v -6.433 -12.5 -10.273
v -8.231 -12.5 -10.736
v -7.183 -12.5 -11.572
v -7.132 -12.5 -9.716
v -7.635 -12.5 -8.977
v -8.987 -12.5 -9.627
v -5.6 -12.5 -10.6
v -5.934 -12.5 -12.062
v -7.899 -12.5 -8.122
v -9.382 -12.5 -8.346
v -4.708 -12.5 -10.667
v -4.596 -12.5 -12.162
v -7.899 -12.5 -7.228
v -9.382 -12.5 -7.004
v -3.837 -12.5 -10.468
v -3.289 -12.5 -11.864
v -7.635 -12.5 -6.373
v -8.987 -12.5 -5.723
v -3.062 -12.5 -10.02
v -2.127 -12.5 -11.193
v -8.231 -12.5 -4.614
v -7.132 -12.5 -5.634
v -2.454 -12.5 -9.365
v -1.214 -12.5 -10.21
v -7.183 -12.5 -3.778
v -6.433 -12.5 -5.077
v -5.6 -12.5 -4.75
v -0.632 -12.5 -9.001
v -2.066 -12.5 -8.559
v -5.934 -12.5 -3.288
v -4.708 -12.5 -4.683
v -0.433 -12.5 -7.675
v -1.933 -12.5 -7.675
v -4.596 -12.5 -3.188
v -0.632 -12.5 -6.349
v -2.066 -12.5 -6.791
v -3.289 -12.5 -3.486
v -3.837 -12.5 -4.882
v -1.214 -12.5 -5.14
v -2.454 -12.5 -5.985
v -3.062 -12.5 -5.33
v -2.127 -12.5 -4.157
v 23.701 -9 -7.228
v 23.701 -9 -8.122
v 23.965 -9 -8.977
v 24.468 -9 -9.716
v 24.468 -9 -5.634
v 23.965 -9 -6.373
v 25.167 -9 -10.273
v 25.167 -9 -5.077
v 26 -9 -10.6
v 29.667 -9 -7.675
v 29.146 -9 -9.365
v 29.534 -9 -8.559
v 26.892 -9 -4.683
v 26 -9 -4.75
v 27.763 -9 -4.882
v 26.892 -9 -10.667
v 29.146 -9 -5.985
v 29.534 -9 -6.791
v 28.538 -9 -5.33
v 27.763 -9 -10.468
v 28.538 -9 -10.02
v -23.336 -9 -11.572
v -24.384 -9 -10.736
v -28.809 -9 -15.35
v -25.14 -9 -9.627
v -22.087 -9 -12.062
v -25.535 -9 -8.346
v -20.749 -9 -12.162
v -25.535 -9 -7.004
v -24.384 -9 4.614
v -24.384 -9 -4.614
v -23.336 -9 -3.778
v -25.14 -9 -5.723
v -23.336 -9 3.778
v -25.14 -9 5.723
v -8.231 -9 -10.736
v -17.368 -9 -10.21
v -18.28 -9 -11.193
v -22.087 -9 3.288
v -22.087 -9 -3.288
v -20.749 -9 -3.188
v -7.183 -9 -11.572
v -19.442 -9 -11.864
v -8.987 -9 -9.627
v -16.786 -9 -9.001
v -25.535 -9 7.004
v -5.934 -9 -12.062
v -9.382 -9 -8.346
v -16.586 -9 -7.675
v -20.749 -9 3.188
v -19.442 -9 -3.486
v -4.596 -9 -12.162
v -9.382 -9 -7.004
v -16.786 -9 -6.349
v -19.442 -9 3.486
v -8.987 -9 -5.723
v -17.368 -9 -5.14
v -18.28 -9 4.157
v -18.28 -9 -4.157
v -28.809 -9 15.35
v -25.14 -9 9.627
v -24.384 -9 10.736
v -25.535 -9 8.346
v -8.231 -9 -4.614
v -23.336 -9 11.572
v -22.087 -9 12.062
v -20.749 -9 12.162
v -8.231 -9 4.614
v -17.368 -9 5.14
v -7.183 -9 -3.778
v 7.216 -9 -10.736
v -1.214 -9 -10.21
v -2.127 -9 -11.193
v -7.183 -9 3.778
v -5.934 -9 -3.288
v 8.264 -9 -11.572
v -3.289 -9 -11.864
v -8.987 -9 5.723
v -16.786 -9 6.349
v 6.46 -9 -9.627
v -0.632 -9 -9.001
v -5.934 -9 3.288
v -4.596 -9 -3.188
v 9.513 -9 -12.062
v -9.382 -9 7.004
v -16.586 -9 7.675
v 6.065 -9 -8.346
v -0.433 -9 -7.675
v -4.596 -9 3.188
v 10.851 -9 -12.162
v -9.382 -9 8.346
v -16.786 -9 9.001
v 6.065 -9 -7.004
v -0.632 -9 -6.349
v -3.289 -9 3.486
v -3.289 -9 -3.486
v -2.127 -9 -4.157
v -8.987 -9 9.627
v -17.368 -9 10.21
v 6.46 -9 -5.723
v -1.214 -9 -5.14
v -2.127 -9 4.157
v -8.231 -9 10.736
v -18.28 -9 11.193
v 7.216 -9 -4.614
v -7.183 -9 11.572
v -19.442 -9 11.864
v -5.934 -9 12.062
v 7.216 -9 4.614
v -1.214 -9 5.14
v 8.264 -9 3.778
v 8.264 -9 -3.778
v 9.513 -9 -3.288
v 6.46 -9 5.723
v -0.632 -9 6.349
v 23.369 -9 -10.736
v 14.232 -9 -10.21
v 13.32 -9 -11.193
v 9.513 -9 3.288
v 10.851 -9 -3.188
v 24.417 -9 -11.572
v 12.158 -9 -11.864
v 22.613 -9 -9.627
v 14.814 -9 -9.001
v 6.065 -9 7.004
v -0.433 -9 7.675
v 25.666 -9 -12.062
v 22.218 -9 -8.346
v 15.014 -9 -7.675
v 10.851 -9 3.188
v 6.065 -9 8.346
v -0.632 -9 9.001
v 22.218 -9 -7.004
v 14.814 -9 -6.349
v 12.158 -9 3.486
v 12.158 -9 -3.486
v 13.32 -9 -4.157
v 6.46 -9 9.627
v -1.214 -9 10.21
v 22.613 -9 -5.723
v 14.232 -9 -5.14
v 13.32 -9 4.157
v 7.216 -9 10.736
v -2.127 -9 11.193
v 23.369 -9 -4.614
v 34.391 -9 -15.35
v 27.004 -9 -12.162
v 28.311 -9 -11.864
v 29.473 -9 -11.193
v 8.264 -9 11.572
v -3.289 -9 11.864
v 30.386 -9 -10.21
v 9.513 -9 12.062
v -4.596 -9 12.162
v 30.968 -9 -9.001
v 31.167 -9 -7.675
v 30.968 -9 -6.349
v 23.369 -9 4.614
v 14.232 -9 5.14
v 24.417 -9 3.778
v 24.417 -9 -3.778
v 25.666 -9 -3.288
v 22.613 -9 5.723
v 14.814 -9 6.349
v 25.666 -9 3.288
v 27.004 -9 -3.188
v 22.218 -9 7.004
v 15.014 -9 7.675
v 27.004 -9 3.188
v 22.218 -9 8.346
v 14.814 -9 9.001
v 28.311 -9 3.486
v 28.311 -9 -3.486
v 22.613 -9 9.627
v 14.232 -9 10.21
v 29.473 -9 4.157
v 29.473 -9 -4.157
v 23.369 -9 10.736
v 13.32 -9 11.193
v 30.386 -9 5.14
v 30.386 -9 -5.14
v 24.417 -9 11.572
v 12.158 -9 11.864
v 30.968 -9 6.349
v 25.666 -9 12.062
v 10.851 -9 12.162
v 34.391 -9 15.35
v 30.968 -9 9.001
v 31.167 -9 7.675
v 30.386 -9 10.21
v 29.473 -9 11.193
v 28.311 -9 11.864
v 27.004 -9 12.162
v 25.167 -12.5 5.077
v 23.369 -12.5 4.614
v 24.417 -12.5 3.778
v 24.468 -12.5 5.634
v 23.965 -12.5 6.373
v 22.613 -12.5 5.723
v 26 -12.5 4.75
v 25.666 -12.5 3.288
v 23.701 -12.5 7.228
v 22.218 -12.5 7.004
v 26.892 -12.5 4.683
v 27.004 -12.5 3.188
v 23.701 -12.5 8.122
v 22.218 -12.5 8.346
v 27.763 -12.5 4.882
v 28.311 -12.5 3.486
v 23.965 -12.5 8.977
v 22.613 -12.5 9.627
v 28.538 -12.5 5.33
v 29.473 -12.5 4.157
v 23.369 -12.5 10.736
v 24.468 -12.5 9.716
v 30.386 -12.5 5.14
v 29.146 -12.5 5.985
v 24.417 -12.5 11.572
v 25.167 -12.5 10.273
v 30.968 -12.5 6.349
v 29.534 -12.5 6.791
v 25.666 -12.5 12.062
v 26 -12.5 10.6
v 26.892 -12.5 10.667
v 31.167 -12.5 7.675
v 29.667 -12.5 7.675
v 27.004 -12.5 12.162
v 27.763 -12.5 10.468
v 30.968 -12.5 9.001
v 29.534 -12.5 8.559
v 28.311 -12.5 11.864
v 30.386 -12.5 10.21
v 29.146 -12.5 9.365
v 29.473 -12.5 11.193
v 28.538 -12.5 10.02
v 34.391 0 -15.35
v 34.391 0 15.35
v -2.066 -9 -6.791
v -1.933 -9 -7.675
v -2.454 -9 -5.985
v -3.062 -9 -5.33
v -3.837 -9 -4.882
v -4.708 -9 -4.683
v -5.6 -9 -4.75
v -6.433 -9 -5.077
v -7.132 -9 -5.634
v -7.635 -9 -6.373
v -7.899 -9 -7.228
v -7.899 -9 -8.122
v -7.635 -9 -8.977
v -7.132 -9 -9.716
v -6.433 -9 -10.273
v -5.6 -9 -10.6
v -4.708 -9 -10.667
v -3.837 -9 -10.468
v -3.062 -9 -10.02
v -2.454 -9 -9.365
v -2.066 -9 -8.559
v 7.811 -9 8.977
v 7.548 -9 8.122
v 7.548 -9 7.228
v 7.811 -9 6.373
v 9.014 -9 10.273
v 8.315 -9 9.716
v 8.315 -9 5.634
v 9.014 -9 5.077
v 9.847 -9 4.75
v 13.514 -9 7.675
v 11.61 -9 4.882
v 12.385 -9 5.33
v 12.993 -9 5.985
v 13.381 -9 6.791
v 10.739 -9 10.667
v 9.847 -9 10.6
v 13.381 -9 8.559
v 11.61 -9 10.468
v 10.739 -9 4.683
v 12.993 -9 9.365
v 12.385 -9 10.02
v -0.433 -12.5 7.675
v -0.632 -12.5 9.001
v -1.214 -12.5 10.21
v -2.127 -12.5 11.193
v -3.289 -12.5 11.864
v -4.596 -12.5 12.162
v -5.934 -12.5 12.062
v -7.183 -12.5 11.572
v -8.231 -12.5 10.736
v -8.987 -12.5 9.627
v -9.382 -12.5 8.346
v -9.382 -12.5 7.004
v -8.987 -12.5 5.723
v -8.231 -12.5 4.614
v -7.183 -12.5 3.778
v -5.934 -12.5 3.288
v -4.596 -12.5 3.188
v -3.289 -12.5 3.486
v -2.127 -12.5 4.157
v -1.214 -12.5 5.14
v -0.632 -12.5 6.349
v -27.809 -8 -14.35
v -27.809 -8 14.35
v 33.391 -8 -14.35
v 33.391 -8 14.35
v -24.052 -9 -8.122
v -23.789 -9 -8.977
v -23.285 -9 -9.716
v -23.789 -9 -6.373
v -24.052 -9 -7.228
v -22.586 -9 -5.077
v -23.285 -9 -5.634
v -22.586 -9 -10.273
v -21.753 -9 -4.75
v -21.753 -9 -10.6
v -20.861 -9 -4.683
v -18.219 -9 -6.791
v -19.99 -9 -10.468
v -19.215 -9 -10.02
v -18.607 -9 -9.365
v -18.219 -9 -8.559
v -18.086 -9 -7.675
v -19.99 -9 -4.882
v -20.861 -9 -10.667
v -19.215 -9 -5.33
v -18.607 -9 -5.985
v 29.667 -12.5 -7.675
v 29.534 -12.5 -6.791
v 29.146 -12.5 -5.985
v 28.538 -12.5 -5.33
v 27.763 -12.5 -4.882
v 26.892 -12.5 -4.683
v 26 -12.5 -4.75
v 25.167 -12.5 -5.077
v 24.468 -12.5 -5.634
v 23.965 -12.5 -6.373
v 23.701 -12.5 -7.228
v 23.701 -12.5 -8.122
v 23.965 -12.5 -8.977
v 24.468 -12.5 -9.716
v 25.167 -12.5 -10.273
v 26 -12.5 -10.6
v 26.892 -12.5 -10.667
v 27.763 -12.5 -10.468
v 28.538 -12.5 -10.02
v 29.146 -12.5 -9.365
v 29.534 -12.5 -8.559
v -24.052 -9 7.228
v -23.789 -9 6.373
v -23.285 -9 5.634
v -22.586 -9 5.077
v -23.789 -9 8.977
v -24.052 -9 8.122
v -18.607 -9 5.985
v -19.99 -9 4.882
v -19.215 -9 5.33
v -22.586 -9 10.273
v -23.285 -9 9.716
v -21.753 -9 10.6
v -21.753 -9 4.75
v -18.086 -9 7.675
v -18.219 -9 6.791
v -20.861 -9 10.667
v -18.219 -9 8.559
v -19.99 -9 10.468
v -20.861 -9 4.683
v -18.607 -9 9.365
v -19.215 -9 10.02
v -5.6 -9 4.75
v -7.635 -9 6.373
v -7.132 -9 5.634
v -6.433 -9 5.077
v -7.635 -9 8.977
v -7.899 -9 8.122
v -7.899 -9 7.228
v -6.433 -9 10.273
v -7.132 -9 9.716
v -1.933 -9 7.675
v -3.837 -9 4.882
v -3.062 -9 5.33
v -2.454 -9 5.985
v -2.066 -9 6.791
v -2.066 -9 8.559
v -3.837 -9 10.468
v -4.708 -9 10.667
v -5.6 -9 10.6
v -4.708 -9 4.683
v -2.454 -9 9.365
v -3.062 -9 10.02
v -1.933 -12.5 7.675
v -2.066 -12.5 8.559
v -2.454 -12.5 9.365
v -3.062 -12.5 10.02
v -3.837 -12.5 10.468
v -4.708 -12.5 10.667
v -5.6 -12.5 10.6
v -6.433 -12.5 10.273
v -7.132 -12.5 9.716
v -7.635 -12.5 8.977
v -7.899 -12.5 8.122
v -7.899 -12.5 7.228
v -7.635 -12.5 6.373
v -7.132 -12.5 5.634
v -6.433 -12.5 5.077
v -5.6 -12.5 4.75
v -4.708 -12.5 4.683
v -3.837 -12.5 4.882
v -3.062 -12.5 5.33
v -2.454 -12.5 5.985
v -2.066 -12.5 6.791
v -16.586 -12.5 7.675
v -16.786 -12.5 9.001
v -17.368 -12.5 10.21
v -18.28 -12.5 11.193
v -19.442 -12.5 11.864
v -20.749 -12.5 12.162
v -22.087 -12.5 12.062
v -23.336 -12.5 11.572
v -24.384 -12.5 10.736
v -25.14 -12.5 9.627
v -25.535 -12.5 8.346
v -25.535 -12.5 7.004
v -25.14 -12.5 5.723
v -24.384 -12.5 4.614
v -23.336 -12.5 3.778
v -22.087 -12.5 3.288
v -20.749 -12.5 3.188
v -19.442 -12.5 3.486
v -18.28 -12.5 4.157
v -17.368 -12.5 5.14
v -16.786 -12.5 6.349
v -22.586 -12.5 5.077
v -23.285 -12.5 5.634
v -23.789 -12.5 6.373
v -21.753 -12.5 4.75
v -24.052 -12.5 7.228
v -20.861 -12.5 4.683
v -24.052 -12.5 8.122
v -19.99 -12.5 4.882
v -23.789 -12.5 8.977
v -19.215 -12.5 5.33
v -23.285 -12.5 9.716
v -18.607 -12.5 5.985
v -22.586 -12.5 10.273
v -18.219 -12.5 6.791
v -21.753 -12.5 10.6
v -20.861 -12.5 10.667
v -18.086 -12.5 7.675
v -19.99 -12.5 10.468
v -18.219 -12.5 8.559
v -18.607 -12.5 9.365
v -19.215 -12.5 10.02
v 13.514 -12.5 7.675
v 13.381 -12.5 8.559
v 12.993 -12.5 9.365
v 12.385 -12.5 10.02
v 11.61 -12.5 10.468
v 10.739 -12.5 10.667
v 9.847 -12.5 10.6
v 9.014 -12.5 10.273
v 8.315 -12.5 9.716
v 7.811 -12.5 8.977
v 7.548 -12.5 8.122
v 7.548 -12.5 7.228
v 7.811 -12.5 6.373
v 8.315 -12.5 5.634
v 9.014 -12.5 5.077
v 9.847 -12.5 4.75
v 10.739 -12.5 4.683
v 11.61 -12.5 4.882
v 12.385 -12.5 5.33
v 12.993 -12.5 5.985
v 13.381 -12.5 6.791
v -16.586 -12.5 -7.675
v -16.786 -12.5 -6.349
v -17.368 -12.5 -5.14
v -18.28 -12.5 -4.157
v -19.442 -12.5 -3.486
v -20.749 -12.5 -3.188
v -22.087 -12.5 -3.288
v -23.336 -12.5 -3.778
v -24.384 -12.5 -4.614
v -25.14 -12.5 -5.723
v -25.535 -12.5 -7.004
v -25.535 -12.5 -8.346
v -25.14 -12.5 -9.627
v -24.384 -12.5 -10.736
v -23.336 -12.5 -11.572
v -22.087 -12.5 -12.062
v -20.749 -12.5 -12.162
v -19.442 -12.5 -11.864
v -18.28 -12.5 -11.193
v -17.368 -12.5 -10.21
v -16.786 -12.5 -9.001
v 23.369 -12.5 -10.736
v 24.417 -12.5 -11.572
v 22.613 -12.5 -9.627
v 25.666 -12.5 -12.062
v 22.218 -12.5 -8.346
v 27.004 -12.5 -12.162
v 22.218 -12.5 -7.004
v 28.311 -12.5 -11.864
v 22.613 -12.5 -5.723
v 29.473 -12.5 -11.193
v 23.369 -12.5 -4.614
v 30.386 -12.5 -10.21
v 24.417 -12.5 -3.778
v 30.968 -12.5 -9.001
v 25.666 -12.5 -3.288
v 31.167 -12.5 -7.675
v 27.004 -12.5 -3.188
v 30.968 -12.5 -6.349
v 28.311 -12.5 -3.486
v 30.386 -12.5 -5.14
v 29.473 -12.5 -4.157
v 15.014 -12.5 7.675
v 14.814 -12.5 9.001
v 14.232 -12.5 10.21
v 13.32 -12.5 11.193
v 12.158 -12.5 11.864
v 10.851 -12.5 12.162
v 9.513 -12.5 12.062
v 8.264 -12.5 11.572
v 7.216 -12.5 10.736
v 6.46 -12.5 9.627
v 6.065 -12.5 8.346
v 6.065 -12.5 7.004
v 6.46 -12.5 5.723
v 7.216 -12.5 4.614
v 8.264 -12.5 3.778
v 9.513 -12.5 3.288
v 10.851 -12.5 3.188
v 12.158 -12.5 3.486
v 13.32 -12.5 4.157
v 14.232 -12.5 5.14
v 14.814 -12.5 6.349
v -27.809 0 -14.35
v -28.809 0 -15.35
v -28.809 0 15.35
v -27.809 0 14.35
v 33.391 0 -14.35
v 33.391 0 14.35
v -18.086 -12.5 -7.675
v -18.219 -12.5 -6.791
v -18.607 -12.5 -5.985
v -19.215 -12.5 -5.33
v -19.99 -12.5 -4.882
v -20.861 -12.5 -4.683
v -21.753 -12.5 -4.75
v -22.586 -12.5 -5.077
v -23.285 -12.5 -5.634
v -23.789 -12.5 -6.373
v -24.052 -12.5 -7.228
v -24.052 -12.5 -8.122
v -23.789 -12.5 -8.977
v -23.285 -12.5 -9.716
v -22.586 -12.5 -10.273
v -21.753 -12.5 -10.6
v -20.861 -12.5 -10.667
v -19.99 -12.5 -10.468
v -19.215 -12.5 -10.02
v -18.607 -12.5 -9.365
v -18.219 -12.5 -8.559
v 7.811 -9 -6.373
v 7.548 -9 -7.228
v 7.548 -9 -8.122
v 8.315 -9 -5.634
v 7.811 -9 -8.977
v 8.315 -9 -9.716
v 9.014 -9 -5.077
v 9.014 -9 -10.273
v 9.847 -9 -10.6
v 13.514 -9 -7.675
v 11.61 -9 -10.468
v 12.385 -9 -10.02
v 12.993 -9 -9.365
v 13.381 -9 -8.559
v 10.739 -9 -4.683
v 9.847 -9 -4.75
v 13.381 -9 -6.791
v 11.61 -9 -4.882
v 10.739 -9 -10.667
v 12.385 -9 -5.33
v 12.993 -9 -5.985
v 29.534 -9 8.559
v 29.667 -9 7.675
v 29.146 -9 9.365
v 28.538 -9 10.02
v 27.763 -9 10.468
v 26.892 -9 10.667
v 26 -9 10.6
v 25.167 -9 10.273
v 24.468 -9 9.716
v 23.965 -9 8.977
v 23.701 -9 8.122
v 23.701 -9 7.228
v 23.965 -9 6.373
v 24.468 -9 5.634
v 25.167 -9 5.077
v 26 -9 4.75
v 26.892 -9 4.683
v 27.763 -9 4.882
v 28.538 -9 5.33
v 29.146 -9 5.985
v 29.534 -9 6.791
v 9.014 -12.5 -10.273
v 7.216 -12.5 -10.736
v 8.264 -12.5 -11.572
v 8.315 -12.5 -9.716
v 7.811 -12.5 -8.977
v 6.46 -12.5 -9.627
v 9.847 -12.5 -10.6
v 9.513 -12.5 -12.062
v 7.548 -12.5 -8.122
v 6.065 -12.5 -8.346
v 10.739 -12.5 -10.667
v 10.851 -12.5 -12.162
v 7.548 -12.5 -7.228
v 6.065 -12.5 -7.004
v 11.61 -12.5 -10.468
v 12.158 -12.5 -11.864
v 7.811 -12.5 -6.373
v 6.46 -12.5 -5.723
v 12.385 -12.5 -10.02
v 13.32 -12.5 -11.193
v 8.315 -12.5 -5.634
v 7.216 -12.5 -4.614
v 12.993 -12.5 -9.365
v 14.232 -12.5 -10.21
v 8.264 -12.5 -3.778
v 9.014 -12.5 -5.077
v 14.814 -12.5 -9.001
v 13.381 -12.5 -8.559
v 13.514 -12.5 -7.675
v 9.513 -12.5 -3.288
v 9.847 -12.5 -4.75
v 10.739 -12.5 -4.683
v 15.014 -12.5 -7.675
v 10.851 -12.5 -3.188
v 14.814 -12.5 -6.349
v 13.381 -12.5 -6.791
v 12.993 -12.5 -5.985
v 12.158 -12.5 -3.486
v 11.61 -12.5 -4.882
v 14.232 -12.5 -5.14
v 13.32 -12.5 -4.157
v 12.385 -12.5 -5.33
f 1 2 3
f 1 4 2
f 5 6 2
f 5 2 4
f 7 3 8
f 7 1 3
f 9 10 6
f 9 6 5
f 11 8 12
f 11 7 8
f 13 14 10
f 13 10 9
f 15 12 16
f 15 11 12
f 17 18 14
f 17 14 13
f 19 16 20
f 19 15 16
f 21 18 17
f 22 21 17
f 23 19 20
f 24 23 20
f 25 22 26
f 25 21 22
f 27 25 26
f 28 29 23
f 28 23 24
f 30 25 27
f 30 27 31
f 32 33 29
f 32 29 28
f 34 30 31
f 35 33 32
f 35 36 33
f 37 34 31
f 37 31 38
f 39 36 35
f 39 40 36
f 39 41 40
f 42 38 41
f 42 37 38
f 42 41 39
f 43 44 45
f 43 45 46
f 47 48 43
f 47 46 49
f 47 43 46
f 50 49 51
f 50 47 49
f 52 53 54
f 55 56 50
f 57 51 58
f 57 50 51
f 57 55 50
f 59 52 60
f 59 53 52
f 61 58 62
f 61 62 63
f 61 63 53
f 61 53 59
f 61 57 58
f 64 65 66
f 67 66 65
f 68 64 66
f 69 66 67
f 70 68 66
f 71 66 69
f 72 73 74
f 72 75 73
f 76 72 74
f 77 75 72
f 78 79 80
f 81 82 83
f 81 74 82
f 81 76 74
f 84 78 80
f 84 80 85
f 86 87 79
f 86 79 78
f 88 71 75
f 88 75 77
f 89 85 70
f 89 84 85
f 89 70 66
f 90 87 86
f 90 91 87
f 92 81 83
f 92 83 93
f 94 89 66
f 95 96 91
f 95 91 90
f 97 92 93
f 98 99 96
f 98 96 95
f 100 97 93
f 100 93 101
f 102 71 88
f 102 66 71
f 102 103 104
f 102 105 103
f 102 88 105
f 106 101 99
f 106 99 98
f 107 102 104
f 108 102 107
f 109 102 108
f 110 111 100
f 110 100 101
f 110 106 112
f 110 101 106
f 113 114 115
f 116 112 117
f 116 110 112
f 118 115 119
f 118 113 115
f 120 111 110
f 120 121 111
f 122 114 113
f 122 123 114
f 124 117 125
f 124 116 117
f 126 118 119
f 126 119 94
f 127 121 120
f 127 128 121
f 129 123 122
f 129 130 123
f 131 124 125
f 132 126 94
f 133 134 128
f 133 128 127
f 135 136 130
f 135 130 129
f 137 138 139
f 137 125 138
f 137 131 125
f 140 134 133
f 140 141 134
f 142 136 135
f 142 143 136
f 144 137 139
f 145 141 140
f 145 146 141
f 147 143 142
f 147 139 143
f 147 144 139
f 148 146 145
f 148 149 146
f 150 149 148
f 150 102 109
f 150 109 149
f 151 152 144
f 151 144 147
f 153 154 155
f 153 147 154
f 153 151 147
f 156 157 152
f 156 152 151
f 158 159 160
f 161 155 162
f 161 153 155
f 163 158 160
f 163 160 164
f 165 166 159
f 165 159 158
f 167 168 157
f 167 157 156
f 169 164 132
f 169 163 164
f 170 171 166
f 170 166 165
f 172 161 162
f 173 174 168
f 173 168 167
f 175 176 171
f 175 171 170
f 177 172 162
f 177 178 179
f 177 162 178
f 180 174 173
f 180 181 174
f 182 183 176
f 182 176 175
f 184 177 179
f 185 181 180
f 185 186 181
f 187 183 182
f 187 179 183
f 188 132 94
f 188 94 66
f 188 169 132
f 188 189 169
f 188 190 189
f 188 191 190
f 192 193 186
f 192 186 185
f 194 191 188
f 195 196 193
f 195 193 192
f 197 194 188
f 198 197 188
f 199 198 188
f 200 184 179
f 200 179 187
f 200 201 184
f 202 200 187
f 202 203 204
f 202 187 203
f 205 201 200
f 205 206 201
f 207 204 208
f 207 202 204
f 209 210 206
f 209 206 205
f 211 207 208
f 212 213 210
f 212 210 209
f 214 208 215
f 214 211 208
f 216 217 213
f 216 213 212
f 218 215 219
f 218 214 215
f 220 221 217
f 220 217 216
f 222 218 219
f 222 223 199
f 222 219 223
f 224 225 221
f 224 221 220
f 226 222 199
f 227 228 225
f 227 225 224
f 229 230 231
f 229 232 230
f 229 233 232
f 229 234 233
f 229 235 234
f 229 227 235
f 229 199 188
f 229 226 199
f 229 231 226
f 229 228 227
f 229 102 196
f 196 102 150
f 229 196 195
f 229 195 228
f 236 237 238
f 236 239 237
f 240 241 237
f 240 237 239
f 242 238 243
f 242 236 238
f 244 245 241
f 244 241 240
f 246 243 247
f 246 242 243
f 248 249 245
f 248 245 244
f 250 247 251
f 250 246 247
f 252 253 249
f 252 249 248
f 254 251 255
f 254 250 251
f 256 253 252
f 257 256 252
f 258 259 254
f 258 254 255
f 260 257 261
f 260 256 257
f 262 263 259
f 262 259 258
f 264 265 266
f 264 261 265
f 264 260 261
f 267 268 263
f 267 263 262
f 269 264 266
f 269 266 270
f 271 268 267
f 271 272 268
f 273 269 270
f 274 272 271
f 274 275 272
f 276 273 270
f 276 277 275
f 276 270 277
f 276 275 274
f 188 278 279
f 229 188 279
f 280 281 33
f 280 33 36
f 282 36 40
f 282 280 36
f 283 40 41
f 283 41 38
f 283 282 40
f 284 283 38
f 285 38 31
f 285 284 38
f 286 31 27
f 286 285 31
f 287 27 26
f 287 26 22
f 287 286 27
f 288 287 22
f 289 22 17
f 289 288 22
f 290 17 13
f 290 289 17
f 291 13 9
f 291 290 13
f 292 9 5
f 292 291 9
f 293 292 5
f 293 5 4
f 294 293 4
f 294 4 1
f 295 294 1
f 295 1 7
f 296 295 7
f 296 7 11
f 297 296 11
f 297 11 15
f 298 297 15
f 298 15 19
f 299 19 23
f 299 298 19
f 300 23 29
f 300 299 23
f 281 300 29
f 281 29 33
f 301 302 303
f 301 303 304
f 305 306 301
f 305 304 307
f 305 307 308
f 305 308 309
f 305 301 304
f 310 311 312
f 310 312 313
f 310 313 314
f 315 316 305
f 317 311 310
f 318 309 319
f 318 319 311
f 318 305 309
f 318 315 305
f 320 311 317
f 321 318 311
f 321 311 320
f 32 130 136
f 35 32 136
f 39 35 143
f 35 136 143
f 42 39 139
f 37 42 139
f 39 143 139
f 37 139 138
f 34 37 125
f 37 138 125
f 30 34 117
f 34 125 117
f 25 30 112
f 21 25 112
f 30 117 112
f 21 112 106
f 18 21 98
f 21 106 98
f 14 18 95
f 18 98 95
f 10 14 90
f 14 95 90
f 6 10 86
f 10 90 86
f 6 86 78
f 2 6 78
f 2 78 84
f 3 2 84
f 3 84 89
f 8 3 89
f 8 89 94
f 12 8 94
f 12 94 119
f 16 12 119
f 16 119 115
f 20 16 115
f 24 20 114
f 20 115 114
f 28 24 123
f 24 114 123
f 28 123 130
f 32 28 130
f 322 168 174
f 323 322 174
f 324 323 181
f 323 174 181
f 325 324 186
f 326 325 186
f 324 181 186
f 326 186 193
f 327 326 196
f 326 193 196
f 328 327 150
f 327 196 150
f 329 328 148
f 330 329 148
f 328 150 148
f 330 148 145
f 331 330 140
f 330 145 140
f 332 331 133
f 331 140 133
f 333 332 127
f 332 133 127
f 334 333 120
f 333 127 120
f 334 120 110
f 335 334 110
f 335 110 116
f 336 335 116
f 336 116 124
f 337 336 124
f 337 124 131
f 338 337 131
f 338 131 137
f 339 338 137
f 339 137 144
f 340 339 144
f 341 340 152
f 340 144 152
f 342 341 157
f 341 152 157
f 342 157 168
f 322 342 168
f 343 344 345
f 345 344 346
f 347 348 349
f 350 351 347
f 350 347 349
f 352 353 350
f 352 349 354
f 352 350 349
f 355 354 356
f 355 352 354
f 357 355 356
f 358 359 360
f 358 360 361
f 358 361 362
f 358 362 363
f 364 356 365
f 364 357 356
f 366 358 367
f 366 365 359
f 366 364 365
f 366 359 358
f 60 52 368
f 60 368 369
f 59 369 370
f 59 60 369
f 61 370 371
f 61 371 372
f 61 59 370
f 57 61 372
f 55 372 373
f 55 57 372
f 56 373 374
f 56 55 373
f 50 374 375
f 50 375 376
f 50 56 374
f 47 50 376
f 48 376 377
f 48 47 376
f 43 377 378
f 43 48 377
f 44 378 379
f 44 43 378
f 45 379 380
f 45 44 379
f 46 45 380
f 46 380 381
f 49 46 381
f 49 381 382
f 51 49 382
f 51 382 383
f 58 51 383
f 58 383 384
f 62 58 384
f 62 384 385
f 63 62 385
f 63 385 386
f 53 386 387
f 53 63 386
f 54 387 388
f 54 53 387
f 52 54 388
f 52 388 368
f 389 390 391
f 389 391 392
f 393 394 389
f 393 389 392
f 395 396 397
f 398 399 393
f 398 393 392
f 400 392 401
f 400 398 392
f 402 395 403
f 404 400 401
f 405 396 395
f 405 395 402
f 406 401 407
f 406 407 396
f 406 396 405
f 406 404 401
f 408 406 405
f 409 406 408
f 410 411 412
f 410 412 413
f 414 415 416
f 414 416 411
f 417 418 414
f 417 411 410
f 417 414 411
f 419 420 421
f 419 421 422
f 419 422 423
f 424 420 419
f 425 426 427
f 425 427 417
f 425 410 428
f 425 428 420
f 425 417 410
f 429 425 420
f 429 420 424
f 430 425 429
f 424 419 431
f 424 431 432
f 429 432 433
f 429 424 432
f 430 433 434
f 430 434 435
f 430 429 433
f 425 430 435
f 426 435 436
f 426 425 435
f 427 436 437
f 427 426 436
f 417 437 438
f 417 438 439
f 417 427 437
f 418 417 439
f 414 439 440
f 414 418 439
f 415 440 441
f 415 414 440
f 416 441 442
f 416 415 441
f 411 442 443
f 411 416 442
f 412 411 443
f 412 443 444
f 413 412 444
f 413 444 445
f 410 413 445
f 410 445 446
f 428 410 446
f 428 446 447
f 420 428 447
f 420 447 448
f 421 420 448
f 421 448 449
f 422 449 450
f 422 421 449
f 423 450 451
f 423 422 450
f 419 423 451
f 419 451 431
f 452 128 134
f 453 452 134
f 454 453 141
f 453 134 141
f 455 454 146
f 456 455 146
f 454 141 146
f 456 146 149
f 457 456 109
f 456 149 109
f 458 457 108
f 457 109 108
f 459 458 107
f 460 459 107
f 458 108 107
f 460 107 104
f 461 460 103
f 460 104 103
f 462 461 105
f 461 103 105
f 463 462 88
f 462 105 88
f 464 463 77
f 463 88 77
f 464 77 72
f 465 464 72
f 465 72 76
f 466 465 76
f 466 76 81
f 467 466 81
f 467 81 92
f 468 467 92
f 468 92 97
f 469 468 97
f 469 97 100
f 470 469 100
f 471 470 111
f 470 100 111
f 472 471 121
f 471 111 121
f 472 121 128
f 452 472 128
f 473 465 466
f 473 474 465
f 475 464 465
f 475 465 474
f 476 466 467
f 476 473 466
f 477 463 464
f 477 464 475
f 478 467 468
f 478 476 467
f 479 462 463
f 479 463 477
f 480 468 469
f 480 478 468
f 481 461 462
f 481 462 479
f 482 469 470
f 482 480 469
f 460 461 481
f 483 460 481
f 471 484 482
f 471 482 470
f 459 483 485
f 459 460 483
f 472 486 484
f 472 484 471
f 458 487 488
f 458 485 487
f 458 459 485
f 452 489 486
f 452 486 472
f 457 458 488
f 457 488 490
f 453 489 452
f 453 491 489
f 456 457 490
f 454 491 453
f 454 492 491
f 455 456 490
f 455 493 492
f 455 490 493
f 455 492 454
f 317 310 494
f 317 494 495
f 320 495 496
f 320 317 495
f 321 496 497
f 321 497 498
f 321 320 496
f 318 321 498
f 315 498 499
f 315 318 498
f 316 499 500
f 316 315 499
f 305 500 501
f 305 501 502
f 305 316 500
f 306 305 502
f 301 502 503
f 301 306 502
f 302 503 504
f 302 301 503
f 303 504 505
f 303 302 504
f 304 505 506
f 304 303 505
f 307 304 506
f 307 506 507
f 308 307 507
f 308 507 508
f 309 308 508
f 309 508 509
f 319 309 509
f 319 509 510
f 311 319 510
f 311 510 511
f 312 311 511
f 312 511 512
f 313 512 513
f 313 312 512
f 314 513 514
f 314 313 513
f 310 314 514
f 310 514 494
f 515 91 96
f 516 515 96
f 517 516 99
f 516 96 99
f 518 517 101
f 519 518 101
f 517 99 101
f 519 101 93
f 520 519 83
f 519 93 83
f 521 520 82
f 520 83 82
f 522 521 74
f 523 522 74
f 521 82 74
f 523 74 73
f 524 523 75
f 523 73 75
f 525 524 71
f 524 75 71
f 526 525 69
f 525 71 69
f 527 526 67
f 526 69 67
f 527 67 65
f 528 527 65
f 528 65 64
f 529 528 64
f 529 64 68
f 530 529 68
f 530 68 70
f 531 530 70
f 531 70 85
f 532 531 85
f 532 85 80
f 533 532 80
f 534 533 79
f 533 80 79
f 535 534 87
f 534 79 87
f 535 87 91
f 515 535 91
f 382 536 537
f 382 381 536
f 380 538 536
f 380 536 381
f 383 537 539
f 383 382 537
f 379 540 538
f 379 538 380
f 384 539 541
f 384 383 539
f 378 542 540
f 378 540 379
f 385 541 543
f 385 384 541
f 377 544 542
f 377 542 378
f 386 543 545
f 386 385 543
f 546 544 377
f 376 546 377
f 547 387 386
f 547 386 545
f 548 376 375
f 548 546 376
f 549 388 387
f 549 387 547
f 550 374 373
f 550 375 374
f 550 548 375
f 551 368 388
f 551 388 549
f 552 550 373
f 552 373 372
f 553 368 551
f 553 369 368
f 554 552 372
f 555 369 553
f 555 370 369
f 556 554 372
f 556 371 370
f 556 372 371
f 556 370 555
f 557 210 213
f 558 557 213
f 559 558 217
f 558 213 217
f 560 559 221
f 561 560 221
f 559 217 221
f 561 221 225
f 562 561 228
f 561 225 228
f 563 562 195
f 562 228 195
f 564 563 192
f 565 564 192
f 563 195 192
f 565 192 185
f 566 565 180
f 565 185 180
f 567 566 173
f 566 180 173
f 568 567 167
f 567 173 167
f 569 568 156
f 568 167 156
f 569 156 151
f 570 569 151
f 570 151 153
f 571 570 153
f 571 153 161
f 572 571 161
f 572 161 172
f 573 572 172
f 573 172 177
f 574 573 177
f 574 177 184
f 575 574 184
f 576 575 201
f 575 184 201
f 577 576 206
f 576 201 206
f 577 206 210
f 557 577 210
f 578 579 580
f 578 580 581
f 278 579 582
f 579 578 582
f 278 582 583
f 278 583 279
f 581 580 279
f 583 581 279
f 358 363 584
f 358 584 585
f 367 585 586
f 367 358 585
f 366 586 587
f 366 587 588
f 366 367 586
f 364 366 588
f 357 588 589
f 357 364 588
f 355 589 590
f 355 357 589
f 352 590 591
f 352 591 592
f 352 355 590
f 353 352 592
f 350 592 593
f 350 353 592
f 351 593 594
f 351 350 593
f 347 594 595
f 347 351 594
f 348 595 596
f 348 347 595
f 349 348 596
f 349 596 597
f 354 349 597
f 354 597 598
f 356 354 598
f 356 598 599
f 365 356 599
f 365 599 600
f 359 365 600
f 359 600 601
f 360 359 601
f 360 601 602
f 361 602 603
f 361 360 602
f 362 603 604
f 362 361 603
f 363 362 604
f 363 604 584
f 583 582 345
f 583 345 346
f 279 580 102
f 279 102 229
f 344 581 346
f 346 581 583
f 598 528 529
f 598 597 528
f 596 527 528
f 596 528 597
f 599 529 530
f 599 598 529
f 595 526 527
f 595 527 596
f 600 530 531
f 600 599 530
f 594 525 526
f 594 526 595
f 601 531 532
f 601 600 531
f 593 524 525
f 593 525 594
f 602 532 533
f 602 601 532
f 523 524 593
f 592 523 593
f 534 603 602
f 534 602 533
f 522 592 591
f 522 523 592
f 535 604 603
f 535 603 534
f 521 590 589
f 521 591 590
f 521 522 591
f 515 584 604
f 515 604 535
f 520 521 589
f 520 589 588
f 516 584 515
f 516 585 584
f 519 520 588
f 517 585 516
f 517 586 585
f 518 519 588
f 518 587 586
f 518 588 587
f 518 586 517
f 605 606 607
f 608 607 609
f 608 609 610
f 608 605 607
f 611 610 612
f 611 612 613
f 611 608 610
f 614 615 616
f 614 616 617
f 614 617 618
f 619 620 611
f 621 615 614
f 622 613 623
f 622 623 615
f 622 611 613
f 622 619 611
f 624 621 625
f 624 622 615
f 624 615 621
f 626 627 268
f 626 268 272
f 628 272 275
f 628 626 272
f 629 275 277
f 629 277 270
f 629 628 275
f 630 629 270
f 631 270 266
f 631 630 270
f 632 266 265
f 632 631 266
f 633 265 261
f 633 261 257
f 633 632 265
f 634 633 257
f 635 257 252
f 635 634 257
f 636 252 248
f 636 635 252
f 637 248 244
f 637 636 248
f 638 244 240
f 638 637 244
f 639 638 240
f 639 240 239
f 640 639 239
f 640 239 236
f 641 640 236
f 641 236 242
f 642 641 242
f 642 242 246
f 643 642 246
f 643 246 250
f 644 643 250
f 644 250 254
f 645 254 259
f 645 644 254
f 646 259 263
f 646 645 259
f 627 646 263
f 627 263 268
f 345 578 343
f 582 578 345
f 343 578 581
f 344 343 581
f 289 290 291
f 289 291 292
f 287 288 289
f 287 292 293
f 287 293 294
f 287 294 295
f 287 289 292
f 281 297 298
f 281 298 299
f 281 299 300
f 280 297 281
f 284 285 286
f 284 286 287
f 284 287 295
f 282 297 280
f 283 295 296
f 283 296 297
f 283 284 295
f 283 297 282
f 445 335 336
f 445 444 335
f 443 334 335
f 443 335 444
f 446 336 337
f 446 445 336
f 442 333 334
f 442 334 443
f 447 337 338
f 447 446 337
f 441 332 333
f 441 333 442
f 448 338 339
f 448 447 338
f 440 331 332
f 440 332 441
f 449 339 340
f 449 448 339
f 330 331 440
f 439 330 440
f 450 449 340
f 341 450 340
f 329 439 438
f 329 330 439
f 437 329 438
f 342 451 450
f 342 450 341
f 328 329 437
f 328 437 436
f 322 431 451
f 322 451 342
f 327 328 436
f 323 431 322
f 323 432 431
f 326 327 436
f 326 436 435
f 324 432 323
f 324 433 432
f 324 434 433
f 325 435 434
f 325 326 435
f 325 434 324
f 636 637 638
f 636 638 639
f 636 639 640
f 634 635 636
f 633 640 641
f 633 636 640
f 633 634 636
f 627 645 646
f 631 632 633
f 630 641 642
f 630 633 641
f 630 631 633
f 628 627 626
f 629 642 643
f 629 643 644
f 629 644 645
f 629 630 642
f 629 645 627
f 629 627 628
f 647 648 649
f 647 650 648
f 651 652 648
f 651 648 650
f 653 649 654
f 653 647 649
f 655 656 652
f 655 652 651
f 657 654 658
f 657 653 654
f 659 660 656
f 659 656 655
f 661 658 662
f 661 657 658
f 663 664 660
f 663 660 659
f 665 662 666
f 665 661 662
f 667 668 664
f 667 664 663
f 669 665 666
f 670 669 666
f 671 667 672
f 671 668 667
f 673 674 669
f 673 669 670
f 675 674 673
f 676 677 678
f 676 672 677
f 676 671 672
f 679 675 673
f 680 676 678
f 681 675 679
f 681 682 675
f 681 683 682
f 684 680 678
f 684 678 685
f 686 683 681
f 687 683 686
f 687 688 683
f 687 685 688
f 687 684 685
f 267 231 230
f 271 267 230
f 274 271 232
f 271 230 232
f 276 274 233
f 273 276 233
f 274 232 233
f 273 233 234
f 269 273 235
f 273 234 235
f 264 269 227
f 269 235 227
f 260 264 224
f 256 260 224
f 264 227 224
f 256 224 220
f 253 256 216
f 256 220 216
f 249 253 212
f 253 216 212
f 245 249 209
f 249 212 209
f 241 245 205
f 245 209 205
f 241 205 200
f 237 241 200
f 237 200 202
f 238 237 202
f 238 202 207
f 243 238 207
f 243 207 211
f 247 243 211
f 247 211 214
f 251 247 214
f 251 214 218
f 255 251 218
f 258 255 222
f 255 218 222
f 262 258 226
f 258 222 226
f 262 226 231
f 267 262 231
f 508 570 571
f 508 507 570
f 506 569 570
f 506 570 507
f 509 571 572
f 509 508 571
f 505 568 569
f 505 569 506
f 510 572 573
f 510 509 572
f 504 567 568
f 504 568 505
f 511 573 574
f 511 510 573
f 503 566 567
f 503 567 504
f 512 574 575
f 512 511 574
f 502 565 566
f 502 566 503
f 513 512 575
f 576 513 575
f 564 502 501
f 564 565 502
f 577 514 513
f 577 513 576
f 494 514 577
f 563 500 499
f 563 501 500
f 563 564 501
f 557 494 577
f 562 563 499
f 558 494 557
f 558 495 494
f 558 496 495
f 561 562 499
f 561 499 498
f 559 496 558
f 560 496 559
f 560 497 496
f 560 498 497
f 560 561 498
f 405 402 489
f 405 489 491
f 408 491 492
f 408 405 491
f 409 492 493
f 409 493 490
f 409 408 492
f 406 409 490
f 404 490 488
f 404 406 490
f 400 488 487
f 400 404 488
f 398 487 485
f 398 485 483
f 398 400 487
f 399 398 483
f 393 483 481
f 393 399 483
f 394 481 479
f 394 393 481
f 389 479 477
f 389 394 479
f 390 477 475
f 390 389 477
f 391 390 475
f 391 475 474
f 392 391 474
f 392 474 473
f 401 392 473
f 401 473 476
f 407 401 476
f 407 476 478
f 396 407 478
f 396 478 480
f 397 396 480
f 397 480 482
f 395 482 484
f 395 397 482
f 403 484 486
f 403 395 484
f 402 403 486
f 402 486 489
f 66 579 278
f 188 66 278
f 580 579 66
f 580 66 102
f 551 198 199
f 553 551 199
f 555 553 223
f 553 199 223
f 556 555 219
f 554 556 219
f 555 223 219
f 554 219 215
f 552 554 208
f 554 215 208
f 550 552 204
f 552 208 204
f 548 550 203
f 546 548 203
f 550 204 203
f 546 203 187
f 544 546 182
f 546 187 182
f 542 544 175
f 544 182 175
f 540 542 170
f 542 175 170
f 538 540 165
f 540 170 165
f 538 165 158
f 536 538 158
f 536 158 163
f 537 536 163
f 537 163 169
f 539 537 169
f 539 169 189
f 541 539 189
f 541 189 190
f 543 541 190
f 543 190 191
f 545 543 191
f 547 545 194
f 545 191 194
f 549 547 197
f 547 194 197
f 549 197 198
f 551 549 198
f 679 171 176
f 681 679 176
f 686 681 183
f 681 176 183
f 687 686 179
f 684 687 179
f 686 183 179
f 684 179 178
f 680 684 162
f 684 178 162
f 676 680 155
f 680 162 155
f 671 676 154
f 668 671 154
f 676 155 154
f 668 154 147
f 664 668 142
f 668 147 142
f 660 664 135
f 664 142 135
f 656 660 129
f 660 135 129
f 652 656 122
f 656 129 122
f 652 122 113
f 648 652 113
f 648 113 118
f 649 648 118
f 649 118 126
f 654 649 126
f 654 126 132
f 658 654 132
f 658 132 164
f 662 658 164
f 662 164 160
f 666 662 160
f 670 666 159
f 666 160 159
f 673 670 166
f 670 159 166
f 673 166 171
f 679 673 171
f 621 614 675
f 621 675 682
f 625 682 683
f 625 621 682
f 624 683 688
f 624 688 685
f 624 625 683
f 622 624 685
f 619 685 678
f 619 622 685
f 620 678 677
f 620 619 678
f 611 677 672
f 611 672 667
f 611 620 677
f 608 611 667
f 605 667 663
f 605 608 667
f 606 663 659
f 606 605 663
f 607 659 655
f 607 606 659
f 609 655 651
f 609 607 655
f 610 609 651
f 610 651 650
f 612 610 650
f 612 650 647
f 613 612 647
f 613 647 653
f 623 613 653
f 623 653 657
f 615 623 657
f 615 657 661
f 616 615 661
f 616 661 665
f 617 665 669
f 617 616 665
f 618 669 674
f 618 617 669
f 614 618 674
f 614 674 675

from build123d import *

# Parameters (mm, degrees)
F0_W     = 63.2
F0_H     = 30.7
F1_DEPTH = 9
F2_R     = 4.5
F2_R_2   = 3
F3_DEPTH = 3.5
F4_T     = 1


# Not quite as in the source:
# - a shell that OpenCascade refuses in one call is made with other operations: the cavity is built on its own and cut out


with BuildPart() as f1:
    # F0 (on Front) → F1 (new body)
    with BuildSketch(Plane.XZ):
        with Locations((2.7909118284, 0)):
            Rectangle(F0_W, F0_H)
    extrude(amount=F1_DEPTH)

    # F2 (on face) → F3 (join)
    with BuildSketch(Plane.XZ.offset(9)):
        with Locations((-21.0856401334, 7.675)):
            Circle(F2_R)
        with Locations((-21.0856401334, 7.675)):
            Circle(F2_R_2, mode=Mode.SUBTRACT)
        with Locations((-4.9325362097, 7.675)):
            Circle(F2_R)
        with Locations((-4.9325362097, 7.675)):
            Circle(F2_R_2, mode=Mode.SUBTRACT)
        with Locations((10.5143598666, 7.675)):
            Circle(F2_R)
        with Locations((10.5143598666, 7.675)):
            Circle(F2_R_2, mode=Mode.SUBTRACT)
        with Locations((-4.9325362097, -7.675)):
            Circle(F2_R)
        with Locations((-4.9325362097, -7.675)):
            Circle(F2_R_2, mode=Mode.SUBTRACT)
        with Locations((10.5143598666, -7.675)):
            Circle(F2_R)
        with Locations((10.5143598666, -7.675)):
            Circle(F2_R_2, mode=Mode.SUBTRACT)
        with Locations((-21.0856401334, -7.675)):
            Circle(F2_R)
        with Locations((-21.0856401334, -7.675)):
            Circle(F2_R_2, mode=Mode.SUBTRACT)
        with Locations((26.6674637903, -7.675)):
            Circle(F2_R)
        with Locations((26.6674637903, -7.675)):
            Circle(F2_R_2, mode=Mode.SUBTRACT)
        with Locations((26.6674637903, 7.675)):
            Circle(F2_R)
        with Locations((26.6674637903, 7.675)):
            Circle(F2_R_2, mode=Mode.SUBTRACT)
    extrude(amount=F3_DEPTH)

    # F4: shell of thickness 1, made by hand


with BuildPart() as f4_core1:
    # F4_t2: copy of F1
    add(f1.part)

    # the walls: a layer under each face that stays
    f4_faces = [f4_core1.faces().sort_by_distance(p)[0] for p in [
        (2.7909118284, -4.5, -15.35),
        (-28.8090881716, -4.5, 0),
        (34.3909118284, -4.5, 0),
        (2.7909118284, -9, 0),
        (2.7909118284, -4.5, 15.35),
        (-25.5856401334, -10.75, -7.675),
        (-9.4325362097, -10.75, -7.675),
        (6.0143598666, -10.75, -7.675),
        (22.1674637903, -10.75, -7.675),
        (-25.5856401334, -10.75, 7.675),
        (-9.4325362097, -10.75, 7.675),
        (6.0143598666, -10.75, 7.675),
        (22.1674637903, -10.75, 7.675),
        (-24.0856401334, -12.5, -10.675),
        (-7.9325362097, -12.5, -10.675),
        (7.5143598666, -12.5, -10.675),
        (23.6674637903, -12.5, -10.675),
        (-24.0856401334, -12.5, 4.675),
        (-7.9325362097, -12.5, 4.675),
        (7.5143598666, -12.5, 4.675),
        (23.6674637903, -12.5, 4.675),
        (-24.0856401334, -10.75, -7.675),
        (-7.9325362097, -10.75, -7.675),
        (7.5143598666, -10.75, -7.675),
        (23.6674637903, -10.75, -7.675),
        (-24.0856401334, -10.75, 7.675),
        (-7.9325362097, -10.75, 7.675),
        (7.5143598666, -10.75, 7.675),
        (23.6674637903, -10.75, 7.675),
        (-21.0856401334, -9, -7.675),
        (-4.9325362097, -9, -7.675),
        (10.5143598666, -9, -7.675),
        (26.6674637903, -9, -7.675),
        (-21.0856401334, -9, 7.675),
        (-4.9325362097, -9, 7.675),
        (10.5143598666, -9, 7.675),
        (26.6674637903, -9, 7.675),
    ]]
    thicken(f4_faces, amount=-F4_T, mode=Mode.SUBTRACT)

    # F4_s3 → F4_t4 (revolve, cut)
    with BuildSketch(Plane.XY.offset(-7.675)):
        Polygon((-16.5756401334, -9.01), (-16.5856401334, -8), (-17.5856401334, -8), (-17.5856401334, -9), align=None)
    revolve(axis=Axis((-21.0856401334, -9, -7.675), (0, -1, 0)), mode=Mode.SUBTRACT)

    # F4_s5 → F4_t6 (revolve, cut)
    with BuildSketch(Plane.XY.offset(-7.675)):
        Polygon((-0.4225362097, -9.01), (-0.4325362097, -8), (-1.4325362097, -8), (-1.4325362097, -9), align=None)
    revolve(axis=Axis((-4.9325362097, -9, -7.675), (0, -1, 0)), mode=Mode.SUBTRACT)

    # F4_s7 → F4_t8 (revolve, cut)
    with BuildSketch(Plane.XY.offset(-7.675)):
        Polygon((15.0243598666, -9.01), (15.0143598666, -8), (14.0143598666, -8), (14.0143598666, -9), align=None)
    revolve(axis=Axis((10.5143598666, -9, -7.675), (0, -1, 0)), mode=Mode.SUBTRACT)

    # F4_s9 → F4_t10 (revolve, cut)
    with BuildSketch(Plane.XY.offset(-7.675)):
        Polygon((31.1774637903, -9.01), (31.1674637903, -8), (30.1674637903, -8), (30.1674637903, -9), align=None)
    revolve(axis=Axis((26.6674637903, -9, -7.675), (0, -1, 0)), mode=Mode.SUBTRACT)

    # F4_s11 → F4_t12 (revolve, cut)
    with BuildSketch(Plane.XY.offset(7.675)):
        Polygon((-16.5756401334, -9.01), (-16.5856401334, -8), (-17.5856401334, -8), (-17.5856401334, -9), align=None)
    revolve(axis=Axis((-21.0856401334, -9, 7.675), (0, -1, 0)), mode=Mode.SUBTRACT)

    # F4_s13 → F4_t14 (revolve, cut)
    with BuildSketch(Plane.XY.offset(7.675)):
        Polygon((-0.4225362097, -9.01), (-0.4325362097, -8), (-1.4325362097, -8), (-1.4325362097, -9), align=None)
    revolve(axis=Axis((-4.9325362097, -9, 7.675), (0, -1, 0)), mode=Mode.SUBTRACT)

    # F4_s15 → F4_t16 (revolve, cut)
    with BuildSketch(Plane.XY.offset(7.675)):
        Polygon((15.0243598666, -9.01), (15.0143598666, -8), (14.0143598666, -8), (14.0143598666, -9), align=None)
    revolve(axis=Axis((10.5143598666, -9, 7.675), (0, -1, 0)), mode=Mode.SUBTRACT)

    # F4_s17 → F4_t18 (revolve, cut)
    with BuildSketch(Plane.XY.offset(7.675)):
        Polygon((31.1774637903, -9.01), (31.1674637903, -8), (30.1674637903, -8), (30.1674637903, -9), align=None)
    revolve(axis=Axis((26.6674637903, -9, 7.675), (0, -1, 0)), mode=Mode.SUBTRACT)

    # F4_s19 → F4_t20 (revolve, cut)
    with BuildSketch(Plane.XY.offset(-7.675)):
        Polygon((-18.0956401334, -9.01), (-17.0856401334, -9), (-17.0856401334, -8), (-18.0856401334, -8), align=None)
    revolve(axis=Axis((-21.0856401334, -9, -7.675), (0, -1, 0)), mode=Mode.SUBTRACT)

    # F4_s21 → F4_t22 (revolve, cut)
    with BuildSketch(Plane.XY.offset(-7.675)):
        Polygon((-1.9425362097, -9.01), (-0.9325362097, -9), (-0.9325362097, -8), (-1.9325362097, -8), align=None)
    revolve(axis=Axis((-4.9325362097, -9, -7.675), (0, -1, 0)), mode=Mode.SUBTRACT)

    # F4_s23 → F4_t24 (revolve, cut)
    with BuildSketch(Plane.XY.offset(-7.675)):
        Polygon((13.5043598666, -9.01), (14.5143598666, -9), (14.5143598666, -8), (13.5143598666, -8), align=None)
    revolve(axis=Axis((10.5143598666, -9, -7.675), (0, -1, 0)), mode=Mode.SUBTRACT)

    # F4_s25 → F4_t26 (revolve, cut)
    with BuildSketch(Plane.XY.offset(-7.675)):
        Polygon((29.6574637903, -9.01), (30.6674637903, -9), (30.6674637903, -8), (29.6674637903, -8), align=None)
    revolve(axis=Axis((26.6674637903, -9, -7.675), (0, -1, 0)), mode=Mode.SUBTRACT)

    # F4_s27 → F4_t28 (revolve, cut)
    with BuildSketch(Plane.XY.offset(7.675)):
        Polygon((-18.0956401334, -9.01), (-17.0856401334, -9), (-17.0856401334, -8), (-18.0856401334, -8), align=None)
    revolve(axis=Axis((-21.0856401334, -9, 7.675), (0, -1, 0)), mode=Mode.SUBTRACT)

    # F4_s29 → F4_t30 (revolve, cut)
    with BuildSketch(Plane.XY.offset(7.675)):
        Polygon((-1.9425362097, -9.01), (-0.9325362097, -9), (-0.9325362097, -8), (-1.9325362097, -8), align=None)
    revolve(axis=Axis((-4.9325362097, -9, 7.675), (0, -1, 0)), mode=Mode.SUBTRACT)

    # F4_s31 → F4_t32 (revolve, cut)
    with BuildSketch(Plane.XY.offset(7.675)):
        Polygon((13.5043598666, -9.01), (14.5143598666, -9), (14.5143598666, -8), (13.5143598666, -8), align=None)
    revolve(axis=Axis((10.5143598666, -9, 7.675), (0, -1, 0)), mode=Mode.SUBTRACT)

    # F4_s33 → F4_t34 (revolve, cut)
    with BuildSketch(Plane.XY.offset(7.675)):
        Polygon((29.6574637903, -9.01), (30.6674637903, -9), (30.6674637903, -8), (29.6674637903, -8), align=None)
    revolve(axis=Axis((26.6674637903, -9, 7.675), (0, -1, 0)), mode=Mode.SUBTRACT)


with BuildPart() as f1_1:
    add(f1.part)

    # what is left inside the walls is the cavity
    f4_cavity = [f4_core1.part.solids().sort_by_distance(p)[0] for p in [
        (2.790912, -0.01, -4.783333),
    ]]
    add(f4_cavity, mode=Mode.SUBTRACT)


solid = f1_1.part
